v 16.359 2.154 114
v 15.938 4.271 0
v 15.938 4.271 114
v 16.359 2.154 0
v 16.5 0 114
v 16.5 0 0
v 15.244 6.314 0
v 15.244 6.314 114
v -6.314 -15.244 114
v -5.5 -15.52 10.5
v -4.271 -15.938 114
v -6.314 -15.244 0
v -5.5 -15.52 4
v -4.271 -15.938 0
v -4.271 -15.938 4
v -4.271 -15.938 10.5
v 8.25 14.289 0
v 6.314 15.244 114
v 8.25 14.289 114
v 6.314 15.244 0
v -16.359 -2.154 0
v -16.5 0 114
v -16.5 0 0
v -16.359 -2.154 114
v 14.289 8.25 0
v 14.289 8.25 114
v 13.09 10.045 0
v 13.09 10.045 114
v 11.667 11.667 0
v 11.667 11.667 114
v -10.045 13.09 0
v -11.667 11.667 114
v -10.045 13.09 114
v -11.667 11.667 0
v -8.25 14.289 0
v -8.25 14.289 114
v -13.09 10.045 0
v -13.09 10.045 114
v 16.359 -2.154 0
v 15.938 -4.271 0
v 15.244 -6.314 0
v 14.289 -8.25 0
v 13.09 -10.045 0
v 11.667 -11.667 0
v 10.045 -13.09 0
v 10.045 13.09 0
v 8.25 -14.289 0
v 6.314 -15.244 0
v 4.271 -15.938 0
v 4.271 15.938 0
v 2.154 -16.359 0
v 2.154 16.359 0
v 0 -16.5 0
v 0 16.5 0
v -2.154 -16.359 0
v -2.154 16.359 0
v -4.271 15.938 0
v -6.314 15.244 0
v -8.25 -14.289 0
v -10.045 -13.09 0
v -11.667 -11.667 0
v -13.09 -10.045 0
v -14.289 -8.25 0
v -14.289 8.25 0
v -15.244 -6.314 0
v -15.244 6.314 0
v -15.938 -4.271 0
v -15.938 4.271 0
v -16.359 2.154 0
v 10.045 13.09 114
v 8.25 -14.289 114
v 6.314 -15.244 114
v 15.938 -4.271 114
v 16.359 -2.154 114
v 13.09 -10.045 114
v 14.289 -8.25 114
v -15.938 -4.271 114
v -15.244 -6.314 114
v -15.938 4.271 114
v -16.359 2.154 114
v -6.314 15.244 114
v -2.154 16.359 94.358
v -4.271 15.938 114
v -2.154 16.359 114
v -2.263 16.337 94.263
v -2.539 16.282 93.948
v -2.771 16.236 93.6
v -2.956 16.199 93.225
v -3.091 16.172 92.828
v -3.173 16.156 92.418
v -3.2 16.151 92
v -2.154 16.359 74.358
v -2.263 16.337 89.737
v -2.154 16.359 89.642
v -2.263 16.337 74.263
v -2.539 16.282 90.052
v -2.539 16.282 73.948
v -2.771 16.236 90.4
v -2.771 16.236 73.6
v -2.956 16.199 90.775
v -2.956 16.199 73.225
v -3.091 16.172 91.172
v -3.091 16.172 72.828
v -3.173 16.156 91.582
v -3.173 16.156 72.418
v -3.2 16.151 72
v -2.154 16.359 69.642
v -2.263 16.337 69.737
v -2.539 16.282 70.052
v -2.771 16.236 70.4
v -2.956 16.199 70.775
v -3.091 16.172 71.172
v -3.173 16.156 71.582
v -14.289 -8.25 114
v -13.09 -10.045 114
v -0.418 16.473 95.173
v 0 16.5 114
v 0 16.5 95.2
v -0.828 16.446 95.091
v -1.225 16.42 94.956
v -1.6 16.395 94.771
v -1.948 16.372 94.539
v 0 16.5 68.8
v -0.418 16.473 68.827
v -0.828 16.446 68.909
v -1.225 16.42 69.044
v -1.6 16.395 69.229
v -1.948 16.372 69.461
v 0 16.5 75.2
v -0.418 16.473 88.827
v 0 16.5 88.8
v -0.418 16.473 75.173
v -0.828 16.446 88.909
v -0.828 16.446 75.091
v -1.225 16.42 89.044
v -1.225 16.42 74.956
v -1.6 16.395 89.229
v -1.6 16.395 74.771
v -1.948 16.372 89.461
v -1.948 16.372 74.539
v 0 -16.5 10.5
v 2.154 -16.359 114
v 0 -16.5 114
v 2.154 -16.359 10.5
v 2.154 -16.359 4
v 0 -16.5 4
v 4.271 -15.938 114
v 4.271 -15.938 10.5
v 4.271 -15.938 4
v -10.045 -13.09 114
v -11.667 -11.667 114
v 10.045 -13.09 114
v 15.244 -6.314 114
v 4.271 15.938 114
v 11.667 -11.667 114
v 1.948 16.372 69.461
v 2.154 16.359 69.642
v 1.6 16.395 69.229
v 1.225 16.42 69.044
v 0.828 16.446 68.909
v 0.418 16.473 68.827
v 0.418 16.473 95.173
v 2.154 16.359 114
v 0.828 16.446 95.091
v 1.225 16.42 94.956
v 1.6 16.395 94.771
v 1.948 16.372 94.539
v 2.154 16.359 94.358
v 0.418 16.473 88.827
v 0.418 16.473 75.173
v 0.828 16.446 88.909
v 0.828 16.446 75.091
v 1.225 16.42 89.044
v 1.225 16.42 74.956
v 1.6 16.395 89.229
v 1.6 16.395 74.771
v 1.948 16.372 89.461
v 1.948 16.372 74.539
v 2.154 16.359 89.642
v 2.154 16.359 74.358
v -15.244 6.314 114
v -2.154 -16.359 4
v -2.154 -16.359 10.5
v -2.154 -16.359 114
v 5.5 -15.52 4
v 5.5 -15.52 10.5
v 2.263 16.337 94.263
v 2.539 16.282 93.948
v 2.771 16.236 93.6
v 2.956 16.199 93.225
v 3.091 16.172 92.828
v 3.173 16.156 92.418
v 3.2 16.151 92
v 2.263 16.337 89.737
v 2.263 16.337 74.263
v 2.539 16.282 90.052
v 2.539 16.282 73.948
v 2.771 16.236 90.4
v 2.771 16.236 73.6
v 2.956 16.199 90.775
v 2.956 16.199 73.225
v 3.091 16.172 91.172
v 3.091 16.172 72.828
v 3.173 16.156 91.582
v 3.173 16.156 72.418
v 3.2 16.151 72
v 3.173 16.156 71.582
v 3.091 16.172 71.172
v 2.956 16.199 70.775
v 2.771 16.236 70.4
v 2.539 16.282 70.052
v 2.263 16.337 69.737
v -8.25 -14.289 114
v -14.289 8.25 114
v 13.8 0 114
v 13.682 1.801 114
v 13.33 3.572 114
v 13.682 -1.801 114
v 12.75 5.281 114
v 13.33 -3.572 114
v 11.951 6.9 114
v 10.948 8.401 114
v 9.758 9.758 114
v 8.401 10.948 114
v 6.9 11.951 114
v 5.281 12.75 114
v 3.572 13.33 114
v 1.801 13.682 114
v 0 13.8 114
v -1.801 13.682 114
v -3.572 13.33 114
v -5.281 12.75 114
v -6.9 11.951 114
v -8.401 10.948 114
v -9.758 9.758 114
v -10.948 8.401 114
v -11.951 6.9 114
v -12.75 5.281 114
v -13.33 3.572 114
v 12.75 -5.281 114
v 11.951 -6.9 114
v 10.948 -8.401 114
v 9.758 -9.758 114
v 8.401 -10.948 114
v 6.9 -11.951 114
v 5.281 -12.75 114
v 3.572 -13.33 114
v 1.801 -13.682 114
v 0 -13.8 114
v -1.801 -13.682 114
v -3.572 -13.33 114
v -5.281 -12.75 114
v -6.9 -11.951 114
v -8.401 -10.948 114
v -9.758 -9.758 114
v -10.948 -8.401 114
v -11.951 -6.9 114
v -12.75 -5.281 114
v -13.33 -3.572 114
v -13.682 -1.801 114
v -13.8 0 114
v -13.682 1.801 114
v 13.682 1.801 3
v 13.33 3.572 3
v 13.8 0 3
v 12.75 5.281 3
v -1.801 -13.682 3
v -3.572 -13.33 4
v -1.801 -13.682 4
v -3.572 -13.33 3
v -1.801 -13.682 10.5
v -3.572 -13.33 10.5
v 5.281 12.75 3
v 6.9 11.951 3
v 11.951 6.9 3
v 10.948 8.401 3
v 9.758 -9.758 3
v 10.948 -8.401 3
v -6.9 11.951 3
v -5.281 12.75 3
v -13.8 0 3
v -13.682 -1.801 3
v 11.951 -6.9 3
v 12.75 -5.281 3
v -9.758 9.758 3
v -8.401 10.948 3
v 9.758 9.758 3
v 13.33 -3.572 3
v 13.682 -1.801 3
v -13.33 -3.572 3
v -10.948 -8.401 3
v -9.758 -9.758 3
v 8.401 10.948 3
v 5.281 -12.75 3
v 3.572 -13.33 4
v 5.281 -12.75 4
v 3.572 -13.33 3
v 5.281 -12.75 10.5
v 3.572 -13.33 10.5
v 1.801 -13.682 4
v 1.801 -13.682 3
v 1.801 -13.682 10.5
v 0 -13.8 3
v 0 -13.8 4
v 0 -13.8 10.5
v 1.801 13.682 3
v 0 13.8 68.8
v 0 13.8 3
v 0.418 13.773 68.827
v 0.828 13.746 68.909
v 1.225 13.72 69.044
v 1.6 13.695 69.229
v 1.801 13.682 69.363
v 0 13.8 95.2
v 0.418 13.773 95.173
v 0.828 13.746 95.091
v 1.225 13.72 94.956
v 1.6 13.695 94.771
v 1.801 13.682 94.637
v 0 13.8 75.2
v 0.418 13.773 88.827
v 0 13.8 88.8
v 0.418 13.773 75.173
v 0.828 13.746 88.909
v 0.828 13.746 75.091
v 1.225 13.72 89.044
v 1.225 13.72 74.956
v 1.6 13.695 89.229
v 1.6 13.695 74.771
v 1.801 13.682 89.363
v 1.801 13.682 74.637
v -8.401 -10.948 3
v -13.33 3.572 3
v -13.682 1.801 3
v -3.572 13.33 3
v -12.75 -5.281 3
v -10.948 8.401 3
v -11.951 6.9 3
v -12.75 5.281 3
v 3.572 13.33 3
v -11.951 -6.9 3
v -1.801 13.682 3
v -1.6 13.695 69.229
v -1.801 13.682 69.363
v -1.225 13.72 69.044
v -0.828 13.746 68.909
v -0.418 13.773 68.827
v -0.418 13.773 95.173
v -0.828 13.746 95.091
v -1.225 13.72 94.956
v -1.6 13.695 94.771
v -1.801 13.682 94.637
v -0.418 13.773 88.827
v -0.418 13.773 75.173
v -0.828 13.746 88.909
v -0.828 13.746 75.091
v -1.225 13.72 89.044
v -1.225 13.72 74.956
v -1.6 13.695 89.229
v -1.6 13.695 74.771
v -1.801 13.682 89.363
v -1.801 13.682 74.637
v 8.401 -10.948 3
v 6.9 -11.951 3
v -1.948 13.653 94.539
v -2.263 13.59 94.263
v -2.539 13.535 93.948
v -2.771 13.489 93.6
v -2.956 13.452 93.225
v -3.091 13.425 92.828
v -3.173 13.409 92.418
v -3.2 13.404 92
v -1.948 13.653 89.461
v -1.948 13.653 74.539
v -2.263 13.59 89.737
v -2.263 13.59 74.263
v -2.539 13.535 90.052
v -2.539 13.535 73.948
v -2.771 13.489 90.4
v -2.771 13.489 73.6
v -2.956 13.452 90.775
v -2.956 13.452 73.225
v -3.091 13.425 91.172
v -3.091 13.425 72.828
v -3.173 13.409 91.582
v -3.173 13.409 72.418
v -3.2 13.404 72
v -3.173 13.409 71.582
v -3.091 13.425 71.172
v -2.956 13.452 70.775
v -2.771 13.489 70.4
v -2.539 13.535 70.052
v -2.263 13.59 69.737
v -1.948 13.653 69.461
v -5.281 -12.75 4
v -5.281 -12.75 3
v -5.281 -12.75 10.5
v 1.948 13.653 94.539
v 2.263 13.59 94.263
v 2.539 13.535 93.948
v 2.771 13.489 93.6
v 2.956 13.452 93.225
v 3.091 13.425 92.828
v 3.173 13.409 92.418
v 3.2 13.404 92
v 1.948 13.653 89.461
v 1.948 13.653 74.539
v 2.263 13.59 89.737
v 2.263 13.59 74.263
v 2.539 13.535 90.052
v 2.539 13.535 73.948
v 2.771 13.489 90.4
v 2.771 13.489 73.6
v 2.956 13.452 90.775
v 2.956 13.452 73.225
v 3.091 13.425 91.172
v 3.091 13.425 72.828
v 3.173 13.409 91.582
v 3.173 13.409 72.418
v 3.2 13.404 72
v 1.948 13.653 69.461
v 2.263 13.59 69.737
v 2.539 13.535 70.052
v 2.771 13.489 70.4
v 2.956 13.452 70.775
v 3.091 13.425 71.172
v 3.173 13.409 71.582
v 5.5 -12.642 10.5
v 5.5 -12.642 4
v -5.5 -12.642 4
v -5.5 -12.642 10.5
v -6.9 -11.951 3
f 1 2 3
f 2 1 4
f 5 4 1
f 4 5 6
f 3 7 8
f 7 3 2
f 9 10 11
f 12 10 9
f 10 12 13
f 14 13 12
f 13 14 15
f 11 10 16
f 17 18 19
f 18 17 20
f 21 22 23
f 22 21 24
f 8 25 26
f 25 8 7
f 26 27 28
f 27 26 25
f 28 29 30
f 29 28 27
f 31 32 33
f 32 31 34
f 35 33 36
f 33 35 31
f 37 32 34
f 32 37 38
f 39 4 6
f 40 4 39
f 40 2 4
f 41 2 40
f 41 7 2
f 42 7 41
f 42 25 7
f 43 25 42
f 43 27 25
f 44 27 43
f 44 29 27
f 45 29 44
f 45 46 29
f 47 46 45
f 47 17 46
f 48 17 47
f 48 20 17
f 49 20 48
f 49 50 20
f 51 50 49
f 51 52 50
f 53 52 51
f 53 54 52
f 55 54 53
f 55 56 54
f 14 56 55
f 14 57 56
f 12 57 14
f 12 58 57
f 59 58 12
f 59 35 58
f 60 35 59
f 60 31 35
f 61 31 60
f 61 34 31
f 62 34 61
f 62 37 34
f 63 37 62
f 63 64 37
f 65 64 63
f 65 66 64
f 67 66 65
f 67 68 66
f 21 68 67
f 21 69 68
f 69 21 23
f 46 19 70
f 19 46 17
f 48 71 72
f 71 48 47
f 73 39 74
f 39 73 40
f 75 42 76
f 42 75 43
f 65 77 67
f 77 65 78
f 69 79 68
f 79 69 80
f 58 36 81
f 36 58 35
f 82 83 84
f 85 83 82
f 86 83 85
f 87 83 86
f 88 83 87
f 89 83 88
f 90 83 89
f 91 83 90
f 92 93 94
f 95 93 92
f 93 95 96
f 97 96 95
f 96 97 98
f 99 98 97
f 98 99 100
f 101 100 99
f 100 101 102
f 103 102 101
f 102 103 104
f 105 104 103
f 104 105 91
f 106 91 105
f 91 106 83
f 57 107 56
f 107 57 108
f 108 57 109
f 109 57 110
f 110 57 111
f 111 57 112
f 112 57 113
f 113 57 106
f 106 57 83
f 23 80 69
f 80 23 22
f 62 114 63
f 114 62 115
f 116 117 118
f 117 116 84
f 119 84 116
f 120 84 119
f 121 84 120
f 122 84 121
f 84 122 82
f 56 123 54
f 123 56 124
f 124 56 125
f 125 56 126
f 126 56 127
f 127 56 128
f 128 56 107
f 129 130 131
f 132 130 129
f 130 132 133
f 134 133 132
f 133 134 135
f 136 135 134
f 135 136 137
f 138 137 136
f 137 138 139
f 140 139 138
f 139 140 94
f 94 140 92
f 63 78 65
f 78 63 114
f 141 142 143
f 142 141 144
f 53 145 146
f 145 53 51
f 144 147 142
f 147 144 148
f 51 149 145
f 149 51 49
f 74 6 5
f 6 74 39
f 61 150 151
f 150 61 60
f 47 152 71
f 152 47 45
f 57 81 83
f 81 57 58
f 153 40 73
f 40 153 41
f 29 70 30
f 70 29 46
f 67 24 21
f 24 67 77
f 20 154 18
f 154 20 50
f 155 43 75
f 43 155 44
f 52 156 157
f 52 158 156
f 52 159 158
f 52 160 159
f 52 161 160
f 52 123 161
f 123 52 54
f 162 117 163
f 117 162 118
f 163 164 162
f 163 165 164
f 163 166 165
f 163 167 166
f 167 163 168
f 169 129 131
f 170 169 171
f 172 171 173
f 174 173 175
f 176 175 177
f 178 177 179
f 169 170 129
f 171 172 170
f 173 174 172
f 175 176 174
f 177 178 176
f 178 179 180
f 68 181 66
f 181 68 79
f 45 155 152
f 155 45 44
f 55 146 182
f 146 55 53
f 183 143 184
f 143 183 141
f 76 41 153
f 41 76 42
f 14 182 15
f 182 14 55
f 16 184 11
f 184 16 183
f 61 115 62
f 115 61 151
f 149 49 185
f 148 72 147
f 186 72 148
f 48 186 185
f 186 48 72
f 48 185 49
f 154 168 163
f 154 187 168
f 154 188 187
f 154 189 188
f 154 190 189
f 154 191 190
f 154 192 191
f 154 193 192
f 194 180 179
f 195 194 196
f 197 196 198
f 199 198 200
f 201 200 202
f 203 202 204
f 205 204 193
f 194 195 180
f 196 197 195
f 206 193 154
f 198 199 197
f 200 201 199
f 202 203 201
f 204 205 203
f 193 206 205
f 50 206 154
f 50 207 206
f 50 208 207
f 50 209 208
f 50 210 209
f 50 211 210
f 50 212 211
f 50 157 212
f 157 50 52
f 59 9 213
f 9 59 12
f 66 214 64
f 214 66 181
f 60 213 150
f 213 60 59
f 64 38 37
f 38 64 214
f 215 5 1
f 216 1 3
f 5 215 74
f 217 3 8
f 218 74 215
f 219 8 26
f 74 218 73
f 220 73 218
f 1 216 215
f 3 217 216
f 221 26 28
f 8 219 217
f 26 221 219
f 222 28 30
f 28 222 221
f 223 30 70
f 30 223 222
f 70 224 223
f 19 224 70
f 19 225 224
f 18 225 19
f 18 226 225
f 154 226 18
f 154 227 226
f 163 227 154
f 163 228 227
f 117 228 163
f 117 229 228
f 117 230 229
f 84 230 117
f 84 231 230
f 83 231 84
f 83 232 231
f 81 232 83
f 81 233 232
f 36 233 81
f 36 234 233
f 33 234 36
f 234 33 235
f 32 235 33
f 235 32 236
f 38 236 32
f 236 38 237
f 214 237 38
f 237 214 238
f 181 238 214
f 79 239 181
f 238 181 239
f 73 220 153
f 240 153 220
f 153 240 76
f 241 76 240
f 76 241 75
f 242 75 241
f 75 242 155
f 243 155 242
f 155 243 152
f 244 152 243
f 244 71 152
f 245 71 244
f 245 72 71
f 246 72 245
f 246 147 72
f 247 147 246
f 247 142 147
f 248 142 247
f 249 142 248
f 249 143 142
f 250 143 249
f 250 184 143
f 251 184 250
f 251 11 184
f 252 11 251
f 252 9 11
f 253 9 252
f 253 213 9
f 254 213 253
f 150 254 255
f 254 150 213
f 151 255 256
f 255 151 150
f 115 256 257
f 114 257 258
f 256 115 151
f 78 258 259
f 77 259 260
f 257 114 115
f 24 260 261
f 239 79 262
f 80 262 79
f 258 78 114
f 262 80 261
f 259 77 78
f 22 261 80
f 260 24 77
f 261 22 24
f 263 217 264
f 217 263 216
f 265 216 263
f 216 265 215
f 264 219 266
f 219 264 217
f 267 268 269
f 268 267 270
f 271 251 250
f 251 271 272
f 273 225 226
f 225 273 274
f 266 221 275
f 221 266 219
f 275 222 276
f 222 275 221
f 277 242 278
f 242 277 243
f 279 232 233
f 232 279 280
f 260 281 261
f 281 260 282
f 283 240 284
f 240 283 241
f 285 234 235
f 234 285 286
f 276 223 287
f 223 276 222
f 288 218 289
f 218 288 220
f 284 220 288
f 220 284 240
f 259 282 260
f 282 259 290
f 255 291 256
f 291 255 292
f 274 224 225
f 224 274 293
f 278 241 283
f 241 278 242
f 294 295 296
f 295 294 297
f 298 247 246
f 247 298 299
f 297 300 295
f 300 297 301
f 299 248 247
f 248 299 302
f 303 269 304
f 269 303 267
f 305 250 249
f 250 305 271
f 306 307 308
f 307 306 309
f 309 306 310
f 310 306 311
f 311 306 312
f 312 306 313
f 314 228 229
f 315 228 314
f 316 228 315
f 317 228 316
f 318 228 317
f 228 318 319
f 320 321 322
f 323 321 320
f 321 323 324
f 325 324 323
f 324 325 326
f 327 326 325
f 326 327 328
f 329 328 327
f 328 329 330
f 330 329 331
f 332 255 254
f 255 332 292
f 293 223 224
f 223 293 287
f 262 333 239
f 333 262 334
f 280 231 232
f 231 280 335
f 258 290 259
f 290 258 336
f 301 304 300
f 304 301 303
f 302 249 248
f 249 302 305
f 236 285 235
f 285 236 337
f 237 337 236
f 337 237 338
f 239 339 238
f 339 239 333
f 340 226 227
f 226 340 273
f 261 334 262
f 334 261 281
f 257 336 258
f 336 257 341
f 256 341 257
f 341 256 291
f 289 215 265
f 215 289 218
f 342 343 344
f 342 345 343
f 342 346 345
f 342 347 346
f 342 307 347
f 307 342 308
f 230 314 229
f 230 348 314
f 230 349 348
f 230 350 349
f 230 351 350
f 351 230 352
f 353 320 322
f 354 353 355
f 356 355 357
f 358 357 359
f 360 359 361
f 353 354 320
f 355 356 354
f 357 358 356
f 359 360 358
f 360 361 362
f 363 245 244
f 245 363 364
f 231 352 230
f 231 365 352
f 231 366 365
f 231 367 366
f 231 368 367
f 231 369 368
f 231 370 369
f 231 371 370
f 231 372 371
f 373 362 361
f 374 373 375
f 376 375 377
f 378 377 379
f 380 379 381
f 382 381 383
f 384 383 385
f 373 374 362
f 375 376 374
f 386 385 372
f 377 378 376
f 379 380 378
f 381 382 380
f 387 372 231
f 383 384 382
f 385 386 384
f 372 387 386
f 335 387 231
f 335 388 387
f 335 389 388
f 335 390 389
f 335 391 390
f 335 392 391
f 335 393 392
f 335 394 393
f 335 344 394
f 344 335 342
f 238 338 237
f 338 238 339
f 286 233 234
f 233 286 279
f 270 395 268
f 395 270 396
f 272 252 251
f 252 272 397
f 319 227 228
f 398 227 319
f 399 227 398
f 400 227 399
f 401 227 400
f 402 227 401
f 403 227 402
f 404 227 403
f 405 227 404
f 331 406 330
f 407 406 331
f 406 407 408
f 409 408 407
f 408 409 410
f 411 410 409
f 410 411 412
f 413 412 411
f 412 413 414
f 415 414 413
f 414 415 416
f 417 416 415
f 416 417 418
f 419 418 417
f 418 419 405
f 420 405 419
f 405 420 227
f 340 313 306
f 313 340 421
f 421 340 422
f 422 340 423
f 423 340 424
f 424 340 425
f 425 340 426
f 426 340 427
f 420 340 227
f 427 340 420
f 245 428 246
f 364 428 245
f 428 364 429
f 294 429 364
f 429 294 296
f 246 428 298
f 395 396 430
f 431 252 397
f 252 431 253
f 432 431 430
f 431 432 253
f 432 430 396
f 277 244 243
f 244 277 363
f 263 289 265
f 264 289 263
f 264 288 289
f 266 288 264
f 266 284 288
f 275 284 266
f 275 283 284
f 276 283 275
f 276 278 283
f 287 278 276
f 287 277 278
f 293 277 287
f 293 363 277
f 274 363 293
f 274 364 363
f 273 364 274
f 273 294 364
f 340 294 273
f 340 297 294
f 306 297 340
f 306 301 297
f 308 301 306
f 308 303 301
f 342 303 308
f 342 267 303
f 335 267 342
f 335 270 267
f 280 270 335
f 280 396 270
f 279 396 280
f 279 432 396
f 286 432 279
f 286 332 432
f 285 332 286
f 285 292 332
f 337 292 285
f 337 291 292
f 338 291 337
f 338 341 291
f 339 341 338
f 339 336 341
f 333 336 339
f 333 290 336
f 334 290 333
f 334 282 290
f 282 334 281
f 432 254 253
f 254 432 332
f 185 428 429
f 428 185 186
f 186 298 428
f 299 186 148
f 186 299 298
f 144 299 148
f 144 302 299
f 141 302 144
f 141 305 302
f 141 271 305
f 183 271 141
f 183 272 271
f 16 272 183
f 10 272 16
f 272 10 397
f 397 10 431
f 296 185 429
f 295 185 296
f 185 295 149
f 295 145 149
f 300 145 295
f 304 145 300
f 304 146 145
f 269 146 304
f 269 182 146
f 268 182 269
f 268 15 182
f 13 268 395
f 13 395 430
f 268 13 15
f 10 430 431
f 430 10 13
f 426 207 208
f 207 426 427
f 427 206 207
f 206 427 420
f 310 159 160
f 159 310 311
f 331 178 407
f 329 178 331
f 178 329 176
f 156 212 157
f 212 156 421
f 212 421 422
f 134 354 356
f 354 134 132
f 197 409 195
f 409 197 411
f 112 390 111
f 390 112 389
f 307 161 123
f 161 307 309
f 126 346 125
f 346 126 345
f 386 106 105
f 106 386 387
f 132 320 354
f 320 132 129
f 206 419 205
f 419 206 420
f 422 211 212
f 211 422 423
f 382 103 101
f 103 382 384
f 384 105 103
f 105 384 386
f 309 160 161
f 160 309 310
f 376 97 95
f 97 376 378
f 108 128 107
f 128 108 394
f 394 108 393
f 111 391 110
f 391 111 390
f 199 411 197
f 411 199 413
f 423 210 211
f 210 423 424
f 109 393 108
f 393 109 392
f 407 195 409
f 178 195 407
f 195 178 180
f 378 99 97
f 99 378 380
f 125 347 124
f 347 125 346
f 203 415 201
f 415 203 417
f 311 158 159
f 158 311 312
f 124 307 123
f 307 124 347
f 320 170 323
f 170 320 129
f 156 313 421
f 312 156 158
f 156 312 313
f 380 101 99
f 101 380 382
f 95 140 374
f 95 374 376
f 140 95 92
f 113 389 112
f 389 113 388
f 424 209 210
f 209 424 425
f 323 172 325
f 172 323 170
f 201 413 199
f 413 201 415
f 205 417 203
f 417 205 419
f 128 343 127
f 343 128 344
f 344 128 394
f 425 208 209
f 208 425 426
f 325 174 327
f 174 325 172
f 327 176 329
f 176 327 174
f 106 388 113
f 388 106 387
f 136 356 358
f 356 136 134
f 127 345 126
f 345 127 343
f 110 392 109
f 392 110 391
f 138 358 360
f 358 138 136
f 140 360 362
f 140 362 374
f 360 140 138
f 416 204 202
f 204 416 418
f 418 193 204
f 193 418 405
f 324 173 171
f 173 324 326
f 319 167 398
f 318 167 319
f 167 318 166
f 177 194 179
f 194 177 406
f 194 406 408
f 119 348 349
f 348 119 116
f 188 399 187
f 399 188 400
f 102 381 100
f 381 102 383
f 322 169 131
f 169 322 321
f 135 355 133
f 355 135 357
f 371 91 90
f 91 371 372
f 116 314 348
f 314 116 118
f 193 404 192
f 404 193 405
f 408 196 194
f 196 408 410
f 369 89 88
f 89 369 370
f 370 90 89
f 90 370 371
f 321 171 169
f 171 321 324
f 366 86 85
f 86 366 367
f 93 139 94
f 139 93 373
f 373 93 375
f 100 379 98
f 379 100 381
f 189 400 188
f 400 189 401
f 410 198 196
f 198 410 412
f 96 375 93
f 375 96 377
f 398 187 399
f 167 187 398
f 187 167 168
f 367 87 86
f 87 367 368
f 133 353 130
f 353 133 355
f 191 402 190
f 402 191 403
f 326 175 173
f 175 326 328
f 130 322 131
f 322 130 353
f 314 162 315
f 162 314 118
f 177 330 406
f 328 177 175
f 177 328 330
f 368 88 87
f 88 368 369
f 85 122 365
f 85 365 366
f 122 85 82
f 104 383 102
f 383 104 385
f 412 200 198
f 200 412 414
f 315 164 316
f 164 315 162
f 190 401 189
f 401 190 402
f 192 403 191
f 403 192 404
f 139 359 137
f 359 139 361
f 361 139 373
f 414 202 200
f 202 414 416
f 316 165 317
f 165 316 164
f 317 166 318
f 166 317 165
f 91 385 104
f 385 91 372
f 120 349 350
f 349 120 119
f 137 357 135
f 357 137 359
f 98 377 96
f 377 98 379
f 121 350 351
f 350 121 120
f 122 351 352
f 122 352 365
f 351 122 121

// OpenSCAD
// cad/mounts_opcionais/wand_enclosure_esp32c3.scad — Varinha Ergonomica COMET-AIR-MOUSE v3.0
$fn = 48;

module wand_case_v3() {
    difference() {
        // Corpo cilindrico ergonomico p/ ESP32-C3 SuperMini + MPU6050 + LiPo 1S
        cylinder(r = 16.5, h = 114);
        translate([0, 0, 3]) cylinder(r = 13.8, h = 112);
        // Janela USB-C na base inferior
        translate([-5.5, -17.5, 4]) cube([11.0, 6.0, 6.5]);
        // Furos para 2 microswitches (GPIO3 Left / GPIO2 Right)
        translate([0, 12, 72]) rotate([-90, 0, 0]) cylinder(r = 3.2, h = 8);
        translate([0, 12, 92]) rotate([-90, 0, 0]) cylinder(r = 3.2, h = 8);
    }
}

wand_case_v3();
